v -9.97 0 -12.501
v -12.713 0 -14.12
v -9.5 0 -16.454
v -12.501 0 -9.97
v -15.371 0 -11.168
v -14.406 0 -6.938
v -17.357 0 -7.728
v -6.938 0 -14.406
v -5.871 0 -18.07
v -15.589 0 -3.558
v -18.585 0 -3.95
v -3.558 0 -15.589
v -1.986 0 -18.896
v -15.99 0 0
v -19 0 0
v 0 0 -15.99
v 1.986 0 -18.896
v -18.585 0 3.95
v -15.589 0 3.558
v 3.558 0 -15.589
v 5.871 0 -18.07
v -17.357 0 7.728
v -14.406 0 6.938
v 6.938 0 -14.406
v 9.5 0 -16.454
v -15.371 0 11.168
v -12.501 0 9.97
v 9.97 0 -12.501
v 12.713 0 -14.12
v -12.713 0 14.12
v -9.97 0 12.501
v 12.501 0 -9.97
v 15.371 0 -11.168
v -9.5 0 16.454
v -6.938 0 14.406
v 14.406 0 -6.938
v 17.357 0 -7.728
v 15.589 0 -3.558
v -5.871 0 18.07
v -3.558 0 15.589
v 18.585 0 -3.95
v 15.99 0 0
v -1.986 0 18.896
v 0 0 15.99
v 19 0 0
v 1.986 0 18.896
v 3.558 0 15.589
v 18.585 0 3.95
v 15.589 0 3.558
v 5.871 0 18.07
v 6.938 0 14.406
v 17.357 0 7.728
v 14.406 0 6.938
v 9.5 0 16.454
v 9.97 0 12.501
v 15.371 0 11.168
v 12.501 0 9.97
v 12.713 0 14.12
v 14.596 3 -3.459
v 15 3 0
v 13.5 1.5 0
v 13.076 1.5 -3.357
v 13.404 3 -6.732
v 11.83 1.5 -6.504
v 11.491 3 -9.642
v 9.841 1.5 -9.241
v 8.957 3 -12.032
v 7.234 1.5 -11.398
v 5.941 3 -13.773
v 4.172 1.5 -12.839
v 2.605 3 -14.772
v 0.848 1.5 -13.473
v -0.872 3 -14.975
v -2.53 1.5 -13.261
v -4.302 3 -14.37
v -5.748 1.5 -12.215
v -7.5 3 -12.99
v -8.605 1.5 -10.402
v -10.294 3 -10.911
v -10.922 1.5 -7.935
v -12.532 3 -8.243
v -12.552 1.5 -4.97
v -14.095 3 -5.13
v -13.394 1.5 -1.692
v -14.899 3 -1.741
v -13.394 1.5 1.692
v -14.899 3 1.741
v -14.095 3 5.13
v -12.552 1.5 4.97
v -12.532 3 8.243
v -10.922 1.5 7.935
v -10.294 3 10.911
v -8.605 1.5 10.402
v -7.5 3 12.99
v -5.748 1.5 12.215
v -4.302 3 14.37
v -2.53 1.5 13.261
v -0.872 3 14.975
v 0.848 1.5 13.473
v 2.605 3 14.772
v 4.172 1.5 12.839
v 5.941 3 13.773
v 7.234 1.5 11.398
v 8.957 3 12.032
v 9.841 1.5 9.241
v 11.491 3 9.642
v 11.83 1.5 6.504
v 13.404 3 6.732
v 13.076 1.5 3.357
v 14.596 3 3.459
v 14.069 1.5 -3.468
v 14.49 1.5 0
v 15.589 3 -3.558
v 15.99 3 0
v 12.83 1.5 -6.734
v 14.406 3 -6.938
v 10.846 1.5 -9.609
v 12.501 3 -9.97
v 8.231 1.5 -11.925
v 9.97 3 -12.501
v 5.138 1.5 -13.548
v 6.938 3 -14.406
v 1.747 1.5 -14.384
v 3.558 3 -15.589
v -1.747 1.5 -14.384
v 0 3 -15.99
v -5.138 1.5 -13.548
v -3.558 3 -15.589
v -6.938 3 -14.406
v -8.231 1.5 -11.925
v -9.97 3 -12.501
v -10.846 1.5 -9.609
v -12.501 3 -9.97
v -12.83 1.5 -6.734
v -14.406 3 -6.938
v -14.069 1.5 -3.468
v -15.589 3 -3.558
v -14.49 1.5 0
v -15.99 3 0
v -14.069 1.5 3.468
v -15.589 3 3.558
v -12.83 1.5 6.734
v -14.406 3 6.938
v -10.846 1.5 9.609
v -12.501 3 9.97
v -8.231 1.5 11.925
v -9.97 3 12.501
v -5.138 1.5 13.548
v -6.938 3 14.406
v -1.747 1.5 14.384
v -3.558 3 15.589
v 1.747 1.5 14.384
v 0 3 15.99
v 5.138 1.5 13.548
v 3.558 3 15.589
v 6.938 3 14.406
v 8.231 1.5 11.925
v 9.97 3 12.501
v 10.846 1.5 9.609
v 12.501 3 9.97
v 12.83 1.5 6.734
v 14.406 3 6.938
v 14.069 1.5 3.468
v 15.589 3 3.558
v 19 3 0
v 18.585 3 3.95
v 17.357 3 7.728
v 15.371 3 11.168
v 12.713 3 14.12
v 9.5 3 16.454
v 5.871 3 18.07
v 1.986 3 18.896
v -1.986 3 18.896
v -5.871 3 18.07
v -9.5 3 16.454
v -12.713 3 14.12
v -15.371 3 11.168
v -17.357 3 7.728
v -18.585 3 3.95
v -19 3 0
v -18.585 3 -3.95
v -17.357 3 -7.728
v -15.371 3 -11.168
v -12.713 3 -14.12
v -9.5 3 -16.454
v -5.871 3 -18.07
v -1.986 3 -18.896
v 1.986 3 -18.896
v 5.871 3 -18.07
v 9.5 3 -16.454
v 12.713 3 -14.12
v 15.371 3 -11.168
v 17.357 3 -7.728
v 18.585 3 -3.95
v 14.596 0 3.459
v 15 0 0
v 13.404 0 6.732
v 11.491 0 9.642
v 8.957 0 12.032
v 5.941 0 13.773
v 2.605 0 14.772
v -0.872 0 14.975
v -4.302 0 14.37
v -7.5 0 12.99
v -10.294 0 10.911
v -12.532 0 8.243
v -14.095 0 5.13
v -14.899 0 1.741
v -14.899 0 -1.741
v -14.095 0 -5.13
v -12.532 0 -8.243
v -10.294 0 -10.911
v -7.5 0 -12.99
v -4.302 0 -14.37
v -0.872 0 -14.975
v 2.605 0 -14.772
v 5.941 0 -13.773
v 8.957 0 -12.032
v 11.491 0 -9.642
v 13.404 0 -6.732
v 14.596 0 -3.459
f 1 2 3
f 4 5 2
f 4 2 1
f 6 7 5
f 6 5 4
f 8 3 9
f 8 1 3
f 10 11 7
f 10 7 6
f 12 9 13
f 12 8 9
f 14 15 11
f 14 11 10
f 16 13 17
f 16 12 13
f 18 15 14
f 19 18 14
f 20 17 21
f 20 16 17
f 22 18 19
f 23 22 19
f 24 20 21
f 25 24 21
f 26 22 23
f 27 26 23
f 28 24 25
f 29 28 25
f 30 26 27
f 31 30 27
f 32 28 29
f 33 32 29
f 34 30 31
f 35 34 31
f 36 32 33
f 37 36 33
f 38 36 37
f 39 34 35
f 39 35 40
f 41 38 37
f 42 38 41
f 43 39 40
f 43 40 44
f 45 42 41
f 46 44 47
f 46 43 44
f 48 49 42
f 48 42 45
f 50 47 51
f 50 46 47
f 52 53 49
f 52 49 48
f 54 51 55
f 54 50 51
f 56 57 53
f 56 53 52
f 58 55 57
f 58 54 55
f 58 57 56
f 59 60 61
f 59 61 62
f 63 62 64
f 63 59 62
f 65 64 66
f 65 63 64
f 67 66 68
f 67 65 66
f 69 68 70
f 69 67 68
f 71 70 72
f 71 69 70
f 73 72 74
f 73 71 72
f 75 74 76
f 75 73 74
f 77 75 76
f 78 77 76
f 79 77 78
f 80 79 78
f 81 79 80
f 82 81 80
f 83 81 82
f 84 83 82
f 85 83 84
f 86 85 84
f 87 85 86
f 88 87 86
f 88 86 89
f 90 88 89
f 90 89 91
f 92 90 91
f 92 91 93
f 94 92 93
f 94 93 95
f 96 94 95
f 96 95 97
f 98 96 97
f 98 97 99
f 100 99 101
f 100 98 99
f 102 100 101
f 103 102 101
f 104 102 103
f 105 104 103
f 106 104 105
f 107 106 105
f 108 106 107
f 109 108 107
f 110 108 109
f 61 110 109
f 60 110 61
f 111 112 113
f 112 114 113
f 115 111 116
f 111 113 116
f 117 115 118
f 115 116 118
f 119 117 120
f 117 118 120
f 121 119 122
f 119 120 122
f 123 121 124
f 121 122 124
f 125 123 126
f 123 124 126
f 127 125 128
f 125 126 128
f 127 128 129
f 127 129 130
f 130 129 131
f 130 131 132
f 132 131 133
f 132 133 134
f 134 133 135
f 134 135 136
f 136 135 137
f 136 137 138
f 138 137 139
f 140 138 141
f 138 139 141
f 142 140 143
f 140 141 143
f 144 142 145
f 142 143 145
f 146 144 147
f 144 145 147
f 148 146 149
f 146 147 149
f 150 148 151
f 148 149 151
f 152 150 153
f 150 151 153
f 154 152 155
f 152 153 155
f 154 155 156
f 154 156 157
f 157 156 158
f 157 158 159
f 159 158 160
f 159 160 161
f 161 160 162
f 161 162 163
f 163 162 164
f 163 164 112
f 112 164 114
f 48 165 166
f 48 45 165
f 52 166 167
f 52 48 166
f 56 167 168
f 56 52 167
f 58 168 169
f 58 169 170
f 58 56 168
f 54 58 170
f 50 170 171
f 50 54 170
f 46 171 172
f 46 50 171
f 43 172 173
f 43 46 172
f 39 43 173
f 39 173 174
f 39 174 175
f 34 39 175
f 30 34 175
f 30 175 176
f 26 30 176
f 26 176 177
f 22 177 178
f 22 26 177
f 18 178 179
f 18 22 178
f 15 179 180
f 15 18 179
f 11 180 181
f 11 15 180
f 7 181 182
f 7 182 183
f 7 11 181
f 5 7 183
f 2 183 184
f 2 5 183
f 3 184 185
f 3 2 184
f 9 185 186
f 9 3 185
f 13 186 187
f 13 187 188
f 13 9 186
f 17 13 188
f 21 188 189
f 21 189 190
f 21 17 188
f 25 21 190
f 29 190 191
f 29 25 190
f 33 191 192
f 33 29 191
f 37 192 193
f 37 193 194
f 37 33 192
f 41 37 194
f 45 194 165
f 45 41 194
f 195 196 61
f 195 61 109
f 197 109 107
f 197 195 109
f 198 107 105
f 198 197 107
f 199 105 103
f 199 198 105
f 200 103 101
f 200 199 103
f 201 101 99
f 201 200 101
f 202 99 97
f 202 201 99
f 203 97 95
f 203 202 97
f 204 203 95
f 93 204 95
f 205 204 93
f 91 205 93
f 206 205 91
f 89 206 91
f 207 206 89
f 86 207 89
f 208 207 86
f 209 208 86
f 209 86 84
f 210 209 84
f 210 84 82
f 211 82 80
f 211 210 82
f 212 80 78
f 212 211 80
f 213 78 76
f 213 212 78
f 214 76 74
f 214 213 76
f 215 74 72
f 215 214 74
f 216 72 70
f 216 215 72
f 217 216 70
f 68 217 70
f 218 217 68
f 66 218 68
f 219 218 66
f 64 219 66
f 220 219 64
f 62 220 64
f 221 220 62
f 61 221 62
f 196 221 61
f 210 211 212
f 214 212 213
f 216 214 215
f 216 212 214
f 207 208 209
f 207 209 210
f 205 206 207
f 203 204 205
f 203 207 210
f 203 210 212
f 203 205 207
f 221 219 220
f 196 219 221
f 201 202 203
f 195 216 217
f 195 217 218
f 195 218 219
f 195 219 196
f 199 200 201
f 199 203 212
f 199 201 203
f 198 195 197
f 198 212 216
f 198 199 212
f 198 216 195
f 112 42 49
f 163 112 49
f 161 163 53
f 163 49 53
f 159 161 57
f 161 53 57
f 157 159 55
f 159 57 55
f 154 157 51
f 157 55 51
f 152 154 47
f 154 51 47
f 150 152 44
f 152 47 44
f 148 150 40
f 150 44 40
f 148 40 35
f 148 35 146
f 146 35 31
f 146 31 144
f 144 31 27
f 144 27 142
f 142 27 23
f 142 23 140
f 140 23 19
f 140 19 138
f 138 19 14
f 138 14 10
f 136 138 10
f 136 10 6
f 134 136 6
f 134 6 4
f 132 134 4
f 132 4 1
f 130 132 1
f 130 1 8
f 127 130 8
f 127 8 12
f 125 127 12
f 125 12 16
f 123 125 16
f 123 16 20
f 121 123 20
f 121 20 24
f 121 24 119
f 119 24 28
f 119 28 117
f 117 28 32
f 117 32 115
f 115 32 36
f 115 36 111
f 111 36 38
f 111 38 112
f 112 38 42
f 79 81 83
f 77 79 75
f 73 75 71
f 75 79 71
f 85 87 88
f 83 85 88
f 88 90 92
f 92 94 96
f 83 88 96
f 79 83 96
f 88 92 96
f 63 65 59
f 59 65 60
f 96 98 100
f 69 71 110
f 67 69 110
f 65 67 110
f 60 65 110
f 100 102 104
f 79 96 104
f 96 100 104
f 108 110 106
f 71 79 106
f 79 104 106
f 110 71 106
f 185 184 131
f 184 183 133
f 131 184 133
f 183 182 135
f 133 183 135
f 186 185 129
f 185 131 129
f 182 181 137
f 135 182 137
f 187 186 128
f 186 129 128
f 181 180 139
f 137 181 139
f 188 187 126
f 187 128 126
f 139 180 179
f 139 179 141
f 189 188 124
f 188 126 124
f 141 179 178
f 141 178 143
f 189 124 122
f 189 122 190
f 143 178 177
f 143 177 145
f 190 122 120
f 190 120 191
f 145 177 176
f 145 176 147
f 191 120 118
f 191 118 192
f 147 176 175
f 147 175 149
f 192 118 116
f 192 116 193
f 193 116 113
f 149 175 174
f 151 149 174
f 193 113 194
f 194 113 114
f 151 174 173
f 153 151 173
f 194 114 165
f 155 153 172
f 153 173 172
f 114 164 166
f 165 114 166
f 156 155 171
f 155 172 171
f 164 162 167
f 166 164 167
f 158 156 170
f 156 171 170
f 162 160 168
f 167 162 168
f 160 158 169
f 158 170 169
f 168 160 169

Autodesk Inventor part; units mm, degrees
ref_plane "YZ Plane" through (0, 0, 0) normal (1, 0, 0) x (0, 1, 0)
ref_plane "XZ Plane" through (0, 0, 0) normal (0, 1, 0) x (-1, 0, 0)
ref_plane "XY Plane" through (0, 0, 0) normal (0, 0, 1) x (1, 0, 0)
sketch "Sketch1" plane through (0, 0, 0) normal (0, 0, 1) x (1, 0, 0)
  line L0 (0, 0) -> (0, -11.2698) construction
  line L1 (0, 0) -> (15, 0)
  line L2 (15, 0) -> (13.5, 1.5)
  line L3 (13.5, 1.5) -> (15, 3)
  line L4 (15, 3) -> (0, 3)
  line L5 (0, 3) -> (0, 0)
  line L6 (15.9899, 3) -> (14.4899, 1.5)
  line L7 (14.4899, 1.5) -> (15.9899, 0)
  line L8 (15.9899, 3) -> (19, 3)
  line L9 (19, 3) -> (19, 0)
  line L10 (19, 0) -> (15.9899, 0)
  point P0 (0, 1.5)
  dimension "d0" = 3
  dimension "d1" = 30
  dimension "d2" = 45
  dimension "d3" = 0.7
  dimension "d6" = 38
revolve "Revolution1" add sketch "Sketch1" angle 360 about axis through (0, 0, 0) along (0, -1, 0)
properties part number "button_test"
